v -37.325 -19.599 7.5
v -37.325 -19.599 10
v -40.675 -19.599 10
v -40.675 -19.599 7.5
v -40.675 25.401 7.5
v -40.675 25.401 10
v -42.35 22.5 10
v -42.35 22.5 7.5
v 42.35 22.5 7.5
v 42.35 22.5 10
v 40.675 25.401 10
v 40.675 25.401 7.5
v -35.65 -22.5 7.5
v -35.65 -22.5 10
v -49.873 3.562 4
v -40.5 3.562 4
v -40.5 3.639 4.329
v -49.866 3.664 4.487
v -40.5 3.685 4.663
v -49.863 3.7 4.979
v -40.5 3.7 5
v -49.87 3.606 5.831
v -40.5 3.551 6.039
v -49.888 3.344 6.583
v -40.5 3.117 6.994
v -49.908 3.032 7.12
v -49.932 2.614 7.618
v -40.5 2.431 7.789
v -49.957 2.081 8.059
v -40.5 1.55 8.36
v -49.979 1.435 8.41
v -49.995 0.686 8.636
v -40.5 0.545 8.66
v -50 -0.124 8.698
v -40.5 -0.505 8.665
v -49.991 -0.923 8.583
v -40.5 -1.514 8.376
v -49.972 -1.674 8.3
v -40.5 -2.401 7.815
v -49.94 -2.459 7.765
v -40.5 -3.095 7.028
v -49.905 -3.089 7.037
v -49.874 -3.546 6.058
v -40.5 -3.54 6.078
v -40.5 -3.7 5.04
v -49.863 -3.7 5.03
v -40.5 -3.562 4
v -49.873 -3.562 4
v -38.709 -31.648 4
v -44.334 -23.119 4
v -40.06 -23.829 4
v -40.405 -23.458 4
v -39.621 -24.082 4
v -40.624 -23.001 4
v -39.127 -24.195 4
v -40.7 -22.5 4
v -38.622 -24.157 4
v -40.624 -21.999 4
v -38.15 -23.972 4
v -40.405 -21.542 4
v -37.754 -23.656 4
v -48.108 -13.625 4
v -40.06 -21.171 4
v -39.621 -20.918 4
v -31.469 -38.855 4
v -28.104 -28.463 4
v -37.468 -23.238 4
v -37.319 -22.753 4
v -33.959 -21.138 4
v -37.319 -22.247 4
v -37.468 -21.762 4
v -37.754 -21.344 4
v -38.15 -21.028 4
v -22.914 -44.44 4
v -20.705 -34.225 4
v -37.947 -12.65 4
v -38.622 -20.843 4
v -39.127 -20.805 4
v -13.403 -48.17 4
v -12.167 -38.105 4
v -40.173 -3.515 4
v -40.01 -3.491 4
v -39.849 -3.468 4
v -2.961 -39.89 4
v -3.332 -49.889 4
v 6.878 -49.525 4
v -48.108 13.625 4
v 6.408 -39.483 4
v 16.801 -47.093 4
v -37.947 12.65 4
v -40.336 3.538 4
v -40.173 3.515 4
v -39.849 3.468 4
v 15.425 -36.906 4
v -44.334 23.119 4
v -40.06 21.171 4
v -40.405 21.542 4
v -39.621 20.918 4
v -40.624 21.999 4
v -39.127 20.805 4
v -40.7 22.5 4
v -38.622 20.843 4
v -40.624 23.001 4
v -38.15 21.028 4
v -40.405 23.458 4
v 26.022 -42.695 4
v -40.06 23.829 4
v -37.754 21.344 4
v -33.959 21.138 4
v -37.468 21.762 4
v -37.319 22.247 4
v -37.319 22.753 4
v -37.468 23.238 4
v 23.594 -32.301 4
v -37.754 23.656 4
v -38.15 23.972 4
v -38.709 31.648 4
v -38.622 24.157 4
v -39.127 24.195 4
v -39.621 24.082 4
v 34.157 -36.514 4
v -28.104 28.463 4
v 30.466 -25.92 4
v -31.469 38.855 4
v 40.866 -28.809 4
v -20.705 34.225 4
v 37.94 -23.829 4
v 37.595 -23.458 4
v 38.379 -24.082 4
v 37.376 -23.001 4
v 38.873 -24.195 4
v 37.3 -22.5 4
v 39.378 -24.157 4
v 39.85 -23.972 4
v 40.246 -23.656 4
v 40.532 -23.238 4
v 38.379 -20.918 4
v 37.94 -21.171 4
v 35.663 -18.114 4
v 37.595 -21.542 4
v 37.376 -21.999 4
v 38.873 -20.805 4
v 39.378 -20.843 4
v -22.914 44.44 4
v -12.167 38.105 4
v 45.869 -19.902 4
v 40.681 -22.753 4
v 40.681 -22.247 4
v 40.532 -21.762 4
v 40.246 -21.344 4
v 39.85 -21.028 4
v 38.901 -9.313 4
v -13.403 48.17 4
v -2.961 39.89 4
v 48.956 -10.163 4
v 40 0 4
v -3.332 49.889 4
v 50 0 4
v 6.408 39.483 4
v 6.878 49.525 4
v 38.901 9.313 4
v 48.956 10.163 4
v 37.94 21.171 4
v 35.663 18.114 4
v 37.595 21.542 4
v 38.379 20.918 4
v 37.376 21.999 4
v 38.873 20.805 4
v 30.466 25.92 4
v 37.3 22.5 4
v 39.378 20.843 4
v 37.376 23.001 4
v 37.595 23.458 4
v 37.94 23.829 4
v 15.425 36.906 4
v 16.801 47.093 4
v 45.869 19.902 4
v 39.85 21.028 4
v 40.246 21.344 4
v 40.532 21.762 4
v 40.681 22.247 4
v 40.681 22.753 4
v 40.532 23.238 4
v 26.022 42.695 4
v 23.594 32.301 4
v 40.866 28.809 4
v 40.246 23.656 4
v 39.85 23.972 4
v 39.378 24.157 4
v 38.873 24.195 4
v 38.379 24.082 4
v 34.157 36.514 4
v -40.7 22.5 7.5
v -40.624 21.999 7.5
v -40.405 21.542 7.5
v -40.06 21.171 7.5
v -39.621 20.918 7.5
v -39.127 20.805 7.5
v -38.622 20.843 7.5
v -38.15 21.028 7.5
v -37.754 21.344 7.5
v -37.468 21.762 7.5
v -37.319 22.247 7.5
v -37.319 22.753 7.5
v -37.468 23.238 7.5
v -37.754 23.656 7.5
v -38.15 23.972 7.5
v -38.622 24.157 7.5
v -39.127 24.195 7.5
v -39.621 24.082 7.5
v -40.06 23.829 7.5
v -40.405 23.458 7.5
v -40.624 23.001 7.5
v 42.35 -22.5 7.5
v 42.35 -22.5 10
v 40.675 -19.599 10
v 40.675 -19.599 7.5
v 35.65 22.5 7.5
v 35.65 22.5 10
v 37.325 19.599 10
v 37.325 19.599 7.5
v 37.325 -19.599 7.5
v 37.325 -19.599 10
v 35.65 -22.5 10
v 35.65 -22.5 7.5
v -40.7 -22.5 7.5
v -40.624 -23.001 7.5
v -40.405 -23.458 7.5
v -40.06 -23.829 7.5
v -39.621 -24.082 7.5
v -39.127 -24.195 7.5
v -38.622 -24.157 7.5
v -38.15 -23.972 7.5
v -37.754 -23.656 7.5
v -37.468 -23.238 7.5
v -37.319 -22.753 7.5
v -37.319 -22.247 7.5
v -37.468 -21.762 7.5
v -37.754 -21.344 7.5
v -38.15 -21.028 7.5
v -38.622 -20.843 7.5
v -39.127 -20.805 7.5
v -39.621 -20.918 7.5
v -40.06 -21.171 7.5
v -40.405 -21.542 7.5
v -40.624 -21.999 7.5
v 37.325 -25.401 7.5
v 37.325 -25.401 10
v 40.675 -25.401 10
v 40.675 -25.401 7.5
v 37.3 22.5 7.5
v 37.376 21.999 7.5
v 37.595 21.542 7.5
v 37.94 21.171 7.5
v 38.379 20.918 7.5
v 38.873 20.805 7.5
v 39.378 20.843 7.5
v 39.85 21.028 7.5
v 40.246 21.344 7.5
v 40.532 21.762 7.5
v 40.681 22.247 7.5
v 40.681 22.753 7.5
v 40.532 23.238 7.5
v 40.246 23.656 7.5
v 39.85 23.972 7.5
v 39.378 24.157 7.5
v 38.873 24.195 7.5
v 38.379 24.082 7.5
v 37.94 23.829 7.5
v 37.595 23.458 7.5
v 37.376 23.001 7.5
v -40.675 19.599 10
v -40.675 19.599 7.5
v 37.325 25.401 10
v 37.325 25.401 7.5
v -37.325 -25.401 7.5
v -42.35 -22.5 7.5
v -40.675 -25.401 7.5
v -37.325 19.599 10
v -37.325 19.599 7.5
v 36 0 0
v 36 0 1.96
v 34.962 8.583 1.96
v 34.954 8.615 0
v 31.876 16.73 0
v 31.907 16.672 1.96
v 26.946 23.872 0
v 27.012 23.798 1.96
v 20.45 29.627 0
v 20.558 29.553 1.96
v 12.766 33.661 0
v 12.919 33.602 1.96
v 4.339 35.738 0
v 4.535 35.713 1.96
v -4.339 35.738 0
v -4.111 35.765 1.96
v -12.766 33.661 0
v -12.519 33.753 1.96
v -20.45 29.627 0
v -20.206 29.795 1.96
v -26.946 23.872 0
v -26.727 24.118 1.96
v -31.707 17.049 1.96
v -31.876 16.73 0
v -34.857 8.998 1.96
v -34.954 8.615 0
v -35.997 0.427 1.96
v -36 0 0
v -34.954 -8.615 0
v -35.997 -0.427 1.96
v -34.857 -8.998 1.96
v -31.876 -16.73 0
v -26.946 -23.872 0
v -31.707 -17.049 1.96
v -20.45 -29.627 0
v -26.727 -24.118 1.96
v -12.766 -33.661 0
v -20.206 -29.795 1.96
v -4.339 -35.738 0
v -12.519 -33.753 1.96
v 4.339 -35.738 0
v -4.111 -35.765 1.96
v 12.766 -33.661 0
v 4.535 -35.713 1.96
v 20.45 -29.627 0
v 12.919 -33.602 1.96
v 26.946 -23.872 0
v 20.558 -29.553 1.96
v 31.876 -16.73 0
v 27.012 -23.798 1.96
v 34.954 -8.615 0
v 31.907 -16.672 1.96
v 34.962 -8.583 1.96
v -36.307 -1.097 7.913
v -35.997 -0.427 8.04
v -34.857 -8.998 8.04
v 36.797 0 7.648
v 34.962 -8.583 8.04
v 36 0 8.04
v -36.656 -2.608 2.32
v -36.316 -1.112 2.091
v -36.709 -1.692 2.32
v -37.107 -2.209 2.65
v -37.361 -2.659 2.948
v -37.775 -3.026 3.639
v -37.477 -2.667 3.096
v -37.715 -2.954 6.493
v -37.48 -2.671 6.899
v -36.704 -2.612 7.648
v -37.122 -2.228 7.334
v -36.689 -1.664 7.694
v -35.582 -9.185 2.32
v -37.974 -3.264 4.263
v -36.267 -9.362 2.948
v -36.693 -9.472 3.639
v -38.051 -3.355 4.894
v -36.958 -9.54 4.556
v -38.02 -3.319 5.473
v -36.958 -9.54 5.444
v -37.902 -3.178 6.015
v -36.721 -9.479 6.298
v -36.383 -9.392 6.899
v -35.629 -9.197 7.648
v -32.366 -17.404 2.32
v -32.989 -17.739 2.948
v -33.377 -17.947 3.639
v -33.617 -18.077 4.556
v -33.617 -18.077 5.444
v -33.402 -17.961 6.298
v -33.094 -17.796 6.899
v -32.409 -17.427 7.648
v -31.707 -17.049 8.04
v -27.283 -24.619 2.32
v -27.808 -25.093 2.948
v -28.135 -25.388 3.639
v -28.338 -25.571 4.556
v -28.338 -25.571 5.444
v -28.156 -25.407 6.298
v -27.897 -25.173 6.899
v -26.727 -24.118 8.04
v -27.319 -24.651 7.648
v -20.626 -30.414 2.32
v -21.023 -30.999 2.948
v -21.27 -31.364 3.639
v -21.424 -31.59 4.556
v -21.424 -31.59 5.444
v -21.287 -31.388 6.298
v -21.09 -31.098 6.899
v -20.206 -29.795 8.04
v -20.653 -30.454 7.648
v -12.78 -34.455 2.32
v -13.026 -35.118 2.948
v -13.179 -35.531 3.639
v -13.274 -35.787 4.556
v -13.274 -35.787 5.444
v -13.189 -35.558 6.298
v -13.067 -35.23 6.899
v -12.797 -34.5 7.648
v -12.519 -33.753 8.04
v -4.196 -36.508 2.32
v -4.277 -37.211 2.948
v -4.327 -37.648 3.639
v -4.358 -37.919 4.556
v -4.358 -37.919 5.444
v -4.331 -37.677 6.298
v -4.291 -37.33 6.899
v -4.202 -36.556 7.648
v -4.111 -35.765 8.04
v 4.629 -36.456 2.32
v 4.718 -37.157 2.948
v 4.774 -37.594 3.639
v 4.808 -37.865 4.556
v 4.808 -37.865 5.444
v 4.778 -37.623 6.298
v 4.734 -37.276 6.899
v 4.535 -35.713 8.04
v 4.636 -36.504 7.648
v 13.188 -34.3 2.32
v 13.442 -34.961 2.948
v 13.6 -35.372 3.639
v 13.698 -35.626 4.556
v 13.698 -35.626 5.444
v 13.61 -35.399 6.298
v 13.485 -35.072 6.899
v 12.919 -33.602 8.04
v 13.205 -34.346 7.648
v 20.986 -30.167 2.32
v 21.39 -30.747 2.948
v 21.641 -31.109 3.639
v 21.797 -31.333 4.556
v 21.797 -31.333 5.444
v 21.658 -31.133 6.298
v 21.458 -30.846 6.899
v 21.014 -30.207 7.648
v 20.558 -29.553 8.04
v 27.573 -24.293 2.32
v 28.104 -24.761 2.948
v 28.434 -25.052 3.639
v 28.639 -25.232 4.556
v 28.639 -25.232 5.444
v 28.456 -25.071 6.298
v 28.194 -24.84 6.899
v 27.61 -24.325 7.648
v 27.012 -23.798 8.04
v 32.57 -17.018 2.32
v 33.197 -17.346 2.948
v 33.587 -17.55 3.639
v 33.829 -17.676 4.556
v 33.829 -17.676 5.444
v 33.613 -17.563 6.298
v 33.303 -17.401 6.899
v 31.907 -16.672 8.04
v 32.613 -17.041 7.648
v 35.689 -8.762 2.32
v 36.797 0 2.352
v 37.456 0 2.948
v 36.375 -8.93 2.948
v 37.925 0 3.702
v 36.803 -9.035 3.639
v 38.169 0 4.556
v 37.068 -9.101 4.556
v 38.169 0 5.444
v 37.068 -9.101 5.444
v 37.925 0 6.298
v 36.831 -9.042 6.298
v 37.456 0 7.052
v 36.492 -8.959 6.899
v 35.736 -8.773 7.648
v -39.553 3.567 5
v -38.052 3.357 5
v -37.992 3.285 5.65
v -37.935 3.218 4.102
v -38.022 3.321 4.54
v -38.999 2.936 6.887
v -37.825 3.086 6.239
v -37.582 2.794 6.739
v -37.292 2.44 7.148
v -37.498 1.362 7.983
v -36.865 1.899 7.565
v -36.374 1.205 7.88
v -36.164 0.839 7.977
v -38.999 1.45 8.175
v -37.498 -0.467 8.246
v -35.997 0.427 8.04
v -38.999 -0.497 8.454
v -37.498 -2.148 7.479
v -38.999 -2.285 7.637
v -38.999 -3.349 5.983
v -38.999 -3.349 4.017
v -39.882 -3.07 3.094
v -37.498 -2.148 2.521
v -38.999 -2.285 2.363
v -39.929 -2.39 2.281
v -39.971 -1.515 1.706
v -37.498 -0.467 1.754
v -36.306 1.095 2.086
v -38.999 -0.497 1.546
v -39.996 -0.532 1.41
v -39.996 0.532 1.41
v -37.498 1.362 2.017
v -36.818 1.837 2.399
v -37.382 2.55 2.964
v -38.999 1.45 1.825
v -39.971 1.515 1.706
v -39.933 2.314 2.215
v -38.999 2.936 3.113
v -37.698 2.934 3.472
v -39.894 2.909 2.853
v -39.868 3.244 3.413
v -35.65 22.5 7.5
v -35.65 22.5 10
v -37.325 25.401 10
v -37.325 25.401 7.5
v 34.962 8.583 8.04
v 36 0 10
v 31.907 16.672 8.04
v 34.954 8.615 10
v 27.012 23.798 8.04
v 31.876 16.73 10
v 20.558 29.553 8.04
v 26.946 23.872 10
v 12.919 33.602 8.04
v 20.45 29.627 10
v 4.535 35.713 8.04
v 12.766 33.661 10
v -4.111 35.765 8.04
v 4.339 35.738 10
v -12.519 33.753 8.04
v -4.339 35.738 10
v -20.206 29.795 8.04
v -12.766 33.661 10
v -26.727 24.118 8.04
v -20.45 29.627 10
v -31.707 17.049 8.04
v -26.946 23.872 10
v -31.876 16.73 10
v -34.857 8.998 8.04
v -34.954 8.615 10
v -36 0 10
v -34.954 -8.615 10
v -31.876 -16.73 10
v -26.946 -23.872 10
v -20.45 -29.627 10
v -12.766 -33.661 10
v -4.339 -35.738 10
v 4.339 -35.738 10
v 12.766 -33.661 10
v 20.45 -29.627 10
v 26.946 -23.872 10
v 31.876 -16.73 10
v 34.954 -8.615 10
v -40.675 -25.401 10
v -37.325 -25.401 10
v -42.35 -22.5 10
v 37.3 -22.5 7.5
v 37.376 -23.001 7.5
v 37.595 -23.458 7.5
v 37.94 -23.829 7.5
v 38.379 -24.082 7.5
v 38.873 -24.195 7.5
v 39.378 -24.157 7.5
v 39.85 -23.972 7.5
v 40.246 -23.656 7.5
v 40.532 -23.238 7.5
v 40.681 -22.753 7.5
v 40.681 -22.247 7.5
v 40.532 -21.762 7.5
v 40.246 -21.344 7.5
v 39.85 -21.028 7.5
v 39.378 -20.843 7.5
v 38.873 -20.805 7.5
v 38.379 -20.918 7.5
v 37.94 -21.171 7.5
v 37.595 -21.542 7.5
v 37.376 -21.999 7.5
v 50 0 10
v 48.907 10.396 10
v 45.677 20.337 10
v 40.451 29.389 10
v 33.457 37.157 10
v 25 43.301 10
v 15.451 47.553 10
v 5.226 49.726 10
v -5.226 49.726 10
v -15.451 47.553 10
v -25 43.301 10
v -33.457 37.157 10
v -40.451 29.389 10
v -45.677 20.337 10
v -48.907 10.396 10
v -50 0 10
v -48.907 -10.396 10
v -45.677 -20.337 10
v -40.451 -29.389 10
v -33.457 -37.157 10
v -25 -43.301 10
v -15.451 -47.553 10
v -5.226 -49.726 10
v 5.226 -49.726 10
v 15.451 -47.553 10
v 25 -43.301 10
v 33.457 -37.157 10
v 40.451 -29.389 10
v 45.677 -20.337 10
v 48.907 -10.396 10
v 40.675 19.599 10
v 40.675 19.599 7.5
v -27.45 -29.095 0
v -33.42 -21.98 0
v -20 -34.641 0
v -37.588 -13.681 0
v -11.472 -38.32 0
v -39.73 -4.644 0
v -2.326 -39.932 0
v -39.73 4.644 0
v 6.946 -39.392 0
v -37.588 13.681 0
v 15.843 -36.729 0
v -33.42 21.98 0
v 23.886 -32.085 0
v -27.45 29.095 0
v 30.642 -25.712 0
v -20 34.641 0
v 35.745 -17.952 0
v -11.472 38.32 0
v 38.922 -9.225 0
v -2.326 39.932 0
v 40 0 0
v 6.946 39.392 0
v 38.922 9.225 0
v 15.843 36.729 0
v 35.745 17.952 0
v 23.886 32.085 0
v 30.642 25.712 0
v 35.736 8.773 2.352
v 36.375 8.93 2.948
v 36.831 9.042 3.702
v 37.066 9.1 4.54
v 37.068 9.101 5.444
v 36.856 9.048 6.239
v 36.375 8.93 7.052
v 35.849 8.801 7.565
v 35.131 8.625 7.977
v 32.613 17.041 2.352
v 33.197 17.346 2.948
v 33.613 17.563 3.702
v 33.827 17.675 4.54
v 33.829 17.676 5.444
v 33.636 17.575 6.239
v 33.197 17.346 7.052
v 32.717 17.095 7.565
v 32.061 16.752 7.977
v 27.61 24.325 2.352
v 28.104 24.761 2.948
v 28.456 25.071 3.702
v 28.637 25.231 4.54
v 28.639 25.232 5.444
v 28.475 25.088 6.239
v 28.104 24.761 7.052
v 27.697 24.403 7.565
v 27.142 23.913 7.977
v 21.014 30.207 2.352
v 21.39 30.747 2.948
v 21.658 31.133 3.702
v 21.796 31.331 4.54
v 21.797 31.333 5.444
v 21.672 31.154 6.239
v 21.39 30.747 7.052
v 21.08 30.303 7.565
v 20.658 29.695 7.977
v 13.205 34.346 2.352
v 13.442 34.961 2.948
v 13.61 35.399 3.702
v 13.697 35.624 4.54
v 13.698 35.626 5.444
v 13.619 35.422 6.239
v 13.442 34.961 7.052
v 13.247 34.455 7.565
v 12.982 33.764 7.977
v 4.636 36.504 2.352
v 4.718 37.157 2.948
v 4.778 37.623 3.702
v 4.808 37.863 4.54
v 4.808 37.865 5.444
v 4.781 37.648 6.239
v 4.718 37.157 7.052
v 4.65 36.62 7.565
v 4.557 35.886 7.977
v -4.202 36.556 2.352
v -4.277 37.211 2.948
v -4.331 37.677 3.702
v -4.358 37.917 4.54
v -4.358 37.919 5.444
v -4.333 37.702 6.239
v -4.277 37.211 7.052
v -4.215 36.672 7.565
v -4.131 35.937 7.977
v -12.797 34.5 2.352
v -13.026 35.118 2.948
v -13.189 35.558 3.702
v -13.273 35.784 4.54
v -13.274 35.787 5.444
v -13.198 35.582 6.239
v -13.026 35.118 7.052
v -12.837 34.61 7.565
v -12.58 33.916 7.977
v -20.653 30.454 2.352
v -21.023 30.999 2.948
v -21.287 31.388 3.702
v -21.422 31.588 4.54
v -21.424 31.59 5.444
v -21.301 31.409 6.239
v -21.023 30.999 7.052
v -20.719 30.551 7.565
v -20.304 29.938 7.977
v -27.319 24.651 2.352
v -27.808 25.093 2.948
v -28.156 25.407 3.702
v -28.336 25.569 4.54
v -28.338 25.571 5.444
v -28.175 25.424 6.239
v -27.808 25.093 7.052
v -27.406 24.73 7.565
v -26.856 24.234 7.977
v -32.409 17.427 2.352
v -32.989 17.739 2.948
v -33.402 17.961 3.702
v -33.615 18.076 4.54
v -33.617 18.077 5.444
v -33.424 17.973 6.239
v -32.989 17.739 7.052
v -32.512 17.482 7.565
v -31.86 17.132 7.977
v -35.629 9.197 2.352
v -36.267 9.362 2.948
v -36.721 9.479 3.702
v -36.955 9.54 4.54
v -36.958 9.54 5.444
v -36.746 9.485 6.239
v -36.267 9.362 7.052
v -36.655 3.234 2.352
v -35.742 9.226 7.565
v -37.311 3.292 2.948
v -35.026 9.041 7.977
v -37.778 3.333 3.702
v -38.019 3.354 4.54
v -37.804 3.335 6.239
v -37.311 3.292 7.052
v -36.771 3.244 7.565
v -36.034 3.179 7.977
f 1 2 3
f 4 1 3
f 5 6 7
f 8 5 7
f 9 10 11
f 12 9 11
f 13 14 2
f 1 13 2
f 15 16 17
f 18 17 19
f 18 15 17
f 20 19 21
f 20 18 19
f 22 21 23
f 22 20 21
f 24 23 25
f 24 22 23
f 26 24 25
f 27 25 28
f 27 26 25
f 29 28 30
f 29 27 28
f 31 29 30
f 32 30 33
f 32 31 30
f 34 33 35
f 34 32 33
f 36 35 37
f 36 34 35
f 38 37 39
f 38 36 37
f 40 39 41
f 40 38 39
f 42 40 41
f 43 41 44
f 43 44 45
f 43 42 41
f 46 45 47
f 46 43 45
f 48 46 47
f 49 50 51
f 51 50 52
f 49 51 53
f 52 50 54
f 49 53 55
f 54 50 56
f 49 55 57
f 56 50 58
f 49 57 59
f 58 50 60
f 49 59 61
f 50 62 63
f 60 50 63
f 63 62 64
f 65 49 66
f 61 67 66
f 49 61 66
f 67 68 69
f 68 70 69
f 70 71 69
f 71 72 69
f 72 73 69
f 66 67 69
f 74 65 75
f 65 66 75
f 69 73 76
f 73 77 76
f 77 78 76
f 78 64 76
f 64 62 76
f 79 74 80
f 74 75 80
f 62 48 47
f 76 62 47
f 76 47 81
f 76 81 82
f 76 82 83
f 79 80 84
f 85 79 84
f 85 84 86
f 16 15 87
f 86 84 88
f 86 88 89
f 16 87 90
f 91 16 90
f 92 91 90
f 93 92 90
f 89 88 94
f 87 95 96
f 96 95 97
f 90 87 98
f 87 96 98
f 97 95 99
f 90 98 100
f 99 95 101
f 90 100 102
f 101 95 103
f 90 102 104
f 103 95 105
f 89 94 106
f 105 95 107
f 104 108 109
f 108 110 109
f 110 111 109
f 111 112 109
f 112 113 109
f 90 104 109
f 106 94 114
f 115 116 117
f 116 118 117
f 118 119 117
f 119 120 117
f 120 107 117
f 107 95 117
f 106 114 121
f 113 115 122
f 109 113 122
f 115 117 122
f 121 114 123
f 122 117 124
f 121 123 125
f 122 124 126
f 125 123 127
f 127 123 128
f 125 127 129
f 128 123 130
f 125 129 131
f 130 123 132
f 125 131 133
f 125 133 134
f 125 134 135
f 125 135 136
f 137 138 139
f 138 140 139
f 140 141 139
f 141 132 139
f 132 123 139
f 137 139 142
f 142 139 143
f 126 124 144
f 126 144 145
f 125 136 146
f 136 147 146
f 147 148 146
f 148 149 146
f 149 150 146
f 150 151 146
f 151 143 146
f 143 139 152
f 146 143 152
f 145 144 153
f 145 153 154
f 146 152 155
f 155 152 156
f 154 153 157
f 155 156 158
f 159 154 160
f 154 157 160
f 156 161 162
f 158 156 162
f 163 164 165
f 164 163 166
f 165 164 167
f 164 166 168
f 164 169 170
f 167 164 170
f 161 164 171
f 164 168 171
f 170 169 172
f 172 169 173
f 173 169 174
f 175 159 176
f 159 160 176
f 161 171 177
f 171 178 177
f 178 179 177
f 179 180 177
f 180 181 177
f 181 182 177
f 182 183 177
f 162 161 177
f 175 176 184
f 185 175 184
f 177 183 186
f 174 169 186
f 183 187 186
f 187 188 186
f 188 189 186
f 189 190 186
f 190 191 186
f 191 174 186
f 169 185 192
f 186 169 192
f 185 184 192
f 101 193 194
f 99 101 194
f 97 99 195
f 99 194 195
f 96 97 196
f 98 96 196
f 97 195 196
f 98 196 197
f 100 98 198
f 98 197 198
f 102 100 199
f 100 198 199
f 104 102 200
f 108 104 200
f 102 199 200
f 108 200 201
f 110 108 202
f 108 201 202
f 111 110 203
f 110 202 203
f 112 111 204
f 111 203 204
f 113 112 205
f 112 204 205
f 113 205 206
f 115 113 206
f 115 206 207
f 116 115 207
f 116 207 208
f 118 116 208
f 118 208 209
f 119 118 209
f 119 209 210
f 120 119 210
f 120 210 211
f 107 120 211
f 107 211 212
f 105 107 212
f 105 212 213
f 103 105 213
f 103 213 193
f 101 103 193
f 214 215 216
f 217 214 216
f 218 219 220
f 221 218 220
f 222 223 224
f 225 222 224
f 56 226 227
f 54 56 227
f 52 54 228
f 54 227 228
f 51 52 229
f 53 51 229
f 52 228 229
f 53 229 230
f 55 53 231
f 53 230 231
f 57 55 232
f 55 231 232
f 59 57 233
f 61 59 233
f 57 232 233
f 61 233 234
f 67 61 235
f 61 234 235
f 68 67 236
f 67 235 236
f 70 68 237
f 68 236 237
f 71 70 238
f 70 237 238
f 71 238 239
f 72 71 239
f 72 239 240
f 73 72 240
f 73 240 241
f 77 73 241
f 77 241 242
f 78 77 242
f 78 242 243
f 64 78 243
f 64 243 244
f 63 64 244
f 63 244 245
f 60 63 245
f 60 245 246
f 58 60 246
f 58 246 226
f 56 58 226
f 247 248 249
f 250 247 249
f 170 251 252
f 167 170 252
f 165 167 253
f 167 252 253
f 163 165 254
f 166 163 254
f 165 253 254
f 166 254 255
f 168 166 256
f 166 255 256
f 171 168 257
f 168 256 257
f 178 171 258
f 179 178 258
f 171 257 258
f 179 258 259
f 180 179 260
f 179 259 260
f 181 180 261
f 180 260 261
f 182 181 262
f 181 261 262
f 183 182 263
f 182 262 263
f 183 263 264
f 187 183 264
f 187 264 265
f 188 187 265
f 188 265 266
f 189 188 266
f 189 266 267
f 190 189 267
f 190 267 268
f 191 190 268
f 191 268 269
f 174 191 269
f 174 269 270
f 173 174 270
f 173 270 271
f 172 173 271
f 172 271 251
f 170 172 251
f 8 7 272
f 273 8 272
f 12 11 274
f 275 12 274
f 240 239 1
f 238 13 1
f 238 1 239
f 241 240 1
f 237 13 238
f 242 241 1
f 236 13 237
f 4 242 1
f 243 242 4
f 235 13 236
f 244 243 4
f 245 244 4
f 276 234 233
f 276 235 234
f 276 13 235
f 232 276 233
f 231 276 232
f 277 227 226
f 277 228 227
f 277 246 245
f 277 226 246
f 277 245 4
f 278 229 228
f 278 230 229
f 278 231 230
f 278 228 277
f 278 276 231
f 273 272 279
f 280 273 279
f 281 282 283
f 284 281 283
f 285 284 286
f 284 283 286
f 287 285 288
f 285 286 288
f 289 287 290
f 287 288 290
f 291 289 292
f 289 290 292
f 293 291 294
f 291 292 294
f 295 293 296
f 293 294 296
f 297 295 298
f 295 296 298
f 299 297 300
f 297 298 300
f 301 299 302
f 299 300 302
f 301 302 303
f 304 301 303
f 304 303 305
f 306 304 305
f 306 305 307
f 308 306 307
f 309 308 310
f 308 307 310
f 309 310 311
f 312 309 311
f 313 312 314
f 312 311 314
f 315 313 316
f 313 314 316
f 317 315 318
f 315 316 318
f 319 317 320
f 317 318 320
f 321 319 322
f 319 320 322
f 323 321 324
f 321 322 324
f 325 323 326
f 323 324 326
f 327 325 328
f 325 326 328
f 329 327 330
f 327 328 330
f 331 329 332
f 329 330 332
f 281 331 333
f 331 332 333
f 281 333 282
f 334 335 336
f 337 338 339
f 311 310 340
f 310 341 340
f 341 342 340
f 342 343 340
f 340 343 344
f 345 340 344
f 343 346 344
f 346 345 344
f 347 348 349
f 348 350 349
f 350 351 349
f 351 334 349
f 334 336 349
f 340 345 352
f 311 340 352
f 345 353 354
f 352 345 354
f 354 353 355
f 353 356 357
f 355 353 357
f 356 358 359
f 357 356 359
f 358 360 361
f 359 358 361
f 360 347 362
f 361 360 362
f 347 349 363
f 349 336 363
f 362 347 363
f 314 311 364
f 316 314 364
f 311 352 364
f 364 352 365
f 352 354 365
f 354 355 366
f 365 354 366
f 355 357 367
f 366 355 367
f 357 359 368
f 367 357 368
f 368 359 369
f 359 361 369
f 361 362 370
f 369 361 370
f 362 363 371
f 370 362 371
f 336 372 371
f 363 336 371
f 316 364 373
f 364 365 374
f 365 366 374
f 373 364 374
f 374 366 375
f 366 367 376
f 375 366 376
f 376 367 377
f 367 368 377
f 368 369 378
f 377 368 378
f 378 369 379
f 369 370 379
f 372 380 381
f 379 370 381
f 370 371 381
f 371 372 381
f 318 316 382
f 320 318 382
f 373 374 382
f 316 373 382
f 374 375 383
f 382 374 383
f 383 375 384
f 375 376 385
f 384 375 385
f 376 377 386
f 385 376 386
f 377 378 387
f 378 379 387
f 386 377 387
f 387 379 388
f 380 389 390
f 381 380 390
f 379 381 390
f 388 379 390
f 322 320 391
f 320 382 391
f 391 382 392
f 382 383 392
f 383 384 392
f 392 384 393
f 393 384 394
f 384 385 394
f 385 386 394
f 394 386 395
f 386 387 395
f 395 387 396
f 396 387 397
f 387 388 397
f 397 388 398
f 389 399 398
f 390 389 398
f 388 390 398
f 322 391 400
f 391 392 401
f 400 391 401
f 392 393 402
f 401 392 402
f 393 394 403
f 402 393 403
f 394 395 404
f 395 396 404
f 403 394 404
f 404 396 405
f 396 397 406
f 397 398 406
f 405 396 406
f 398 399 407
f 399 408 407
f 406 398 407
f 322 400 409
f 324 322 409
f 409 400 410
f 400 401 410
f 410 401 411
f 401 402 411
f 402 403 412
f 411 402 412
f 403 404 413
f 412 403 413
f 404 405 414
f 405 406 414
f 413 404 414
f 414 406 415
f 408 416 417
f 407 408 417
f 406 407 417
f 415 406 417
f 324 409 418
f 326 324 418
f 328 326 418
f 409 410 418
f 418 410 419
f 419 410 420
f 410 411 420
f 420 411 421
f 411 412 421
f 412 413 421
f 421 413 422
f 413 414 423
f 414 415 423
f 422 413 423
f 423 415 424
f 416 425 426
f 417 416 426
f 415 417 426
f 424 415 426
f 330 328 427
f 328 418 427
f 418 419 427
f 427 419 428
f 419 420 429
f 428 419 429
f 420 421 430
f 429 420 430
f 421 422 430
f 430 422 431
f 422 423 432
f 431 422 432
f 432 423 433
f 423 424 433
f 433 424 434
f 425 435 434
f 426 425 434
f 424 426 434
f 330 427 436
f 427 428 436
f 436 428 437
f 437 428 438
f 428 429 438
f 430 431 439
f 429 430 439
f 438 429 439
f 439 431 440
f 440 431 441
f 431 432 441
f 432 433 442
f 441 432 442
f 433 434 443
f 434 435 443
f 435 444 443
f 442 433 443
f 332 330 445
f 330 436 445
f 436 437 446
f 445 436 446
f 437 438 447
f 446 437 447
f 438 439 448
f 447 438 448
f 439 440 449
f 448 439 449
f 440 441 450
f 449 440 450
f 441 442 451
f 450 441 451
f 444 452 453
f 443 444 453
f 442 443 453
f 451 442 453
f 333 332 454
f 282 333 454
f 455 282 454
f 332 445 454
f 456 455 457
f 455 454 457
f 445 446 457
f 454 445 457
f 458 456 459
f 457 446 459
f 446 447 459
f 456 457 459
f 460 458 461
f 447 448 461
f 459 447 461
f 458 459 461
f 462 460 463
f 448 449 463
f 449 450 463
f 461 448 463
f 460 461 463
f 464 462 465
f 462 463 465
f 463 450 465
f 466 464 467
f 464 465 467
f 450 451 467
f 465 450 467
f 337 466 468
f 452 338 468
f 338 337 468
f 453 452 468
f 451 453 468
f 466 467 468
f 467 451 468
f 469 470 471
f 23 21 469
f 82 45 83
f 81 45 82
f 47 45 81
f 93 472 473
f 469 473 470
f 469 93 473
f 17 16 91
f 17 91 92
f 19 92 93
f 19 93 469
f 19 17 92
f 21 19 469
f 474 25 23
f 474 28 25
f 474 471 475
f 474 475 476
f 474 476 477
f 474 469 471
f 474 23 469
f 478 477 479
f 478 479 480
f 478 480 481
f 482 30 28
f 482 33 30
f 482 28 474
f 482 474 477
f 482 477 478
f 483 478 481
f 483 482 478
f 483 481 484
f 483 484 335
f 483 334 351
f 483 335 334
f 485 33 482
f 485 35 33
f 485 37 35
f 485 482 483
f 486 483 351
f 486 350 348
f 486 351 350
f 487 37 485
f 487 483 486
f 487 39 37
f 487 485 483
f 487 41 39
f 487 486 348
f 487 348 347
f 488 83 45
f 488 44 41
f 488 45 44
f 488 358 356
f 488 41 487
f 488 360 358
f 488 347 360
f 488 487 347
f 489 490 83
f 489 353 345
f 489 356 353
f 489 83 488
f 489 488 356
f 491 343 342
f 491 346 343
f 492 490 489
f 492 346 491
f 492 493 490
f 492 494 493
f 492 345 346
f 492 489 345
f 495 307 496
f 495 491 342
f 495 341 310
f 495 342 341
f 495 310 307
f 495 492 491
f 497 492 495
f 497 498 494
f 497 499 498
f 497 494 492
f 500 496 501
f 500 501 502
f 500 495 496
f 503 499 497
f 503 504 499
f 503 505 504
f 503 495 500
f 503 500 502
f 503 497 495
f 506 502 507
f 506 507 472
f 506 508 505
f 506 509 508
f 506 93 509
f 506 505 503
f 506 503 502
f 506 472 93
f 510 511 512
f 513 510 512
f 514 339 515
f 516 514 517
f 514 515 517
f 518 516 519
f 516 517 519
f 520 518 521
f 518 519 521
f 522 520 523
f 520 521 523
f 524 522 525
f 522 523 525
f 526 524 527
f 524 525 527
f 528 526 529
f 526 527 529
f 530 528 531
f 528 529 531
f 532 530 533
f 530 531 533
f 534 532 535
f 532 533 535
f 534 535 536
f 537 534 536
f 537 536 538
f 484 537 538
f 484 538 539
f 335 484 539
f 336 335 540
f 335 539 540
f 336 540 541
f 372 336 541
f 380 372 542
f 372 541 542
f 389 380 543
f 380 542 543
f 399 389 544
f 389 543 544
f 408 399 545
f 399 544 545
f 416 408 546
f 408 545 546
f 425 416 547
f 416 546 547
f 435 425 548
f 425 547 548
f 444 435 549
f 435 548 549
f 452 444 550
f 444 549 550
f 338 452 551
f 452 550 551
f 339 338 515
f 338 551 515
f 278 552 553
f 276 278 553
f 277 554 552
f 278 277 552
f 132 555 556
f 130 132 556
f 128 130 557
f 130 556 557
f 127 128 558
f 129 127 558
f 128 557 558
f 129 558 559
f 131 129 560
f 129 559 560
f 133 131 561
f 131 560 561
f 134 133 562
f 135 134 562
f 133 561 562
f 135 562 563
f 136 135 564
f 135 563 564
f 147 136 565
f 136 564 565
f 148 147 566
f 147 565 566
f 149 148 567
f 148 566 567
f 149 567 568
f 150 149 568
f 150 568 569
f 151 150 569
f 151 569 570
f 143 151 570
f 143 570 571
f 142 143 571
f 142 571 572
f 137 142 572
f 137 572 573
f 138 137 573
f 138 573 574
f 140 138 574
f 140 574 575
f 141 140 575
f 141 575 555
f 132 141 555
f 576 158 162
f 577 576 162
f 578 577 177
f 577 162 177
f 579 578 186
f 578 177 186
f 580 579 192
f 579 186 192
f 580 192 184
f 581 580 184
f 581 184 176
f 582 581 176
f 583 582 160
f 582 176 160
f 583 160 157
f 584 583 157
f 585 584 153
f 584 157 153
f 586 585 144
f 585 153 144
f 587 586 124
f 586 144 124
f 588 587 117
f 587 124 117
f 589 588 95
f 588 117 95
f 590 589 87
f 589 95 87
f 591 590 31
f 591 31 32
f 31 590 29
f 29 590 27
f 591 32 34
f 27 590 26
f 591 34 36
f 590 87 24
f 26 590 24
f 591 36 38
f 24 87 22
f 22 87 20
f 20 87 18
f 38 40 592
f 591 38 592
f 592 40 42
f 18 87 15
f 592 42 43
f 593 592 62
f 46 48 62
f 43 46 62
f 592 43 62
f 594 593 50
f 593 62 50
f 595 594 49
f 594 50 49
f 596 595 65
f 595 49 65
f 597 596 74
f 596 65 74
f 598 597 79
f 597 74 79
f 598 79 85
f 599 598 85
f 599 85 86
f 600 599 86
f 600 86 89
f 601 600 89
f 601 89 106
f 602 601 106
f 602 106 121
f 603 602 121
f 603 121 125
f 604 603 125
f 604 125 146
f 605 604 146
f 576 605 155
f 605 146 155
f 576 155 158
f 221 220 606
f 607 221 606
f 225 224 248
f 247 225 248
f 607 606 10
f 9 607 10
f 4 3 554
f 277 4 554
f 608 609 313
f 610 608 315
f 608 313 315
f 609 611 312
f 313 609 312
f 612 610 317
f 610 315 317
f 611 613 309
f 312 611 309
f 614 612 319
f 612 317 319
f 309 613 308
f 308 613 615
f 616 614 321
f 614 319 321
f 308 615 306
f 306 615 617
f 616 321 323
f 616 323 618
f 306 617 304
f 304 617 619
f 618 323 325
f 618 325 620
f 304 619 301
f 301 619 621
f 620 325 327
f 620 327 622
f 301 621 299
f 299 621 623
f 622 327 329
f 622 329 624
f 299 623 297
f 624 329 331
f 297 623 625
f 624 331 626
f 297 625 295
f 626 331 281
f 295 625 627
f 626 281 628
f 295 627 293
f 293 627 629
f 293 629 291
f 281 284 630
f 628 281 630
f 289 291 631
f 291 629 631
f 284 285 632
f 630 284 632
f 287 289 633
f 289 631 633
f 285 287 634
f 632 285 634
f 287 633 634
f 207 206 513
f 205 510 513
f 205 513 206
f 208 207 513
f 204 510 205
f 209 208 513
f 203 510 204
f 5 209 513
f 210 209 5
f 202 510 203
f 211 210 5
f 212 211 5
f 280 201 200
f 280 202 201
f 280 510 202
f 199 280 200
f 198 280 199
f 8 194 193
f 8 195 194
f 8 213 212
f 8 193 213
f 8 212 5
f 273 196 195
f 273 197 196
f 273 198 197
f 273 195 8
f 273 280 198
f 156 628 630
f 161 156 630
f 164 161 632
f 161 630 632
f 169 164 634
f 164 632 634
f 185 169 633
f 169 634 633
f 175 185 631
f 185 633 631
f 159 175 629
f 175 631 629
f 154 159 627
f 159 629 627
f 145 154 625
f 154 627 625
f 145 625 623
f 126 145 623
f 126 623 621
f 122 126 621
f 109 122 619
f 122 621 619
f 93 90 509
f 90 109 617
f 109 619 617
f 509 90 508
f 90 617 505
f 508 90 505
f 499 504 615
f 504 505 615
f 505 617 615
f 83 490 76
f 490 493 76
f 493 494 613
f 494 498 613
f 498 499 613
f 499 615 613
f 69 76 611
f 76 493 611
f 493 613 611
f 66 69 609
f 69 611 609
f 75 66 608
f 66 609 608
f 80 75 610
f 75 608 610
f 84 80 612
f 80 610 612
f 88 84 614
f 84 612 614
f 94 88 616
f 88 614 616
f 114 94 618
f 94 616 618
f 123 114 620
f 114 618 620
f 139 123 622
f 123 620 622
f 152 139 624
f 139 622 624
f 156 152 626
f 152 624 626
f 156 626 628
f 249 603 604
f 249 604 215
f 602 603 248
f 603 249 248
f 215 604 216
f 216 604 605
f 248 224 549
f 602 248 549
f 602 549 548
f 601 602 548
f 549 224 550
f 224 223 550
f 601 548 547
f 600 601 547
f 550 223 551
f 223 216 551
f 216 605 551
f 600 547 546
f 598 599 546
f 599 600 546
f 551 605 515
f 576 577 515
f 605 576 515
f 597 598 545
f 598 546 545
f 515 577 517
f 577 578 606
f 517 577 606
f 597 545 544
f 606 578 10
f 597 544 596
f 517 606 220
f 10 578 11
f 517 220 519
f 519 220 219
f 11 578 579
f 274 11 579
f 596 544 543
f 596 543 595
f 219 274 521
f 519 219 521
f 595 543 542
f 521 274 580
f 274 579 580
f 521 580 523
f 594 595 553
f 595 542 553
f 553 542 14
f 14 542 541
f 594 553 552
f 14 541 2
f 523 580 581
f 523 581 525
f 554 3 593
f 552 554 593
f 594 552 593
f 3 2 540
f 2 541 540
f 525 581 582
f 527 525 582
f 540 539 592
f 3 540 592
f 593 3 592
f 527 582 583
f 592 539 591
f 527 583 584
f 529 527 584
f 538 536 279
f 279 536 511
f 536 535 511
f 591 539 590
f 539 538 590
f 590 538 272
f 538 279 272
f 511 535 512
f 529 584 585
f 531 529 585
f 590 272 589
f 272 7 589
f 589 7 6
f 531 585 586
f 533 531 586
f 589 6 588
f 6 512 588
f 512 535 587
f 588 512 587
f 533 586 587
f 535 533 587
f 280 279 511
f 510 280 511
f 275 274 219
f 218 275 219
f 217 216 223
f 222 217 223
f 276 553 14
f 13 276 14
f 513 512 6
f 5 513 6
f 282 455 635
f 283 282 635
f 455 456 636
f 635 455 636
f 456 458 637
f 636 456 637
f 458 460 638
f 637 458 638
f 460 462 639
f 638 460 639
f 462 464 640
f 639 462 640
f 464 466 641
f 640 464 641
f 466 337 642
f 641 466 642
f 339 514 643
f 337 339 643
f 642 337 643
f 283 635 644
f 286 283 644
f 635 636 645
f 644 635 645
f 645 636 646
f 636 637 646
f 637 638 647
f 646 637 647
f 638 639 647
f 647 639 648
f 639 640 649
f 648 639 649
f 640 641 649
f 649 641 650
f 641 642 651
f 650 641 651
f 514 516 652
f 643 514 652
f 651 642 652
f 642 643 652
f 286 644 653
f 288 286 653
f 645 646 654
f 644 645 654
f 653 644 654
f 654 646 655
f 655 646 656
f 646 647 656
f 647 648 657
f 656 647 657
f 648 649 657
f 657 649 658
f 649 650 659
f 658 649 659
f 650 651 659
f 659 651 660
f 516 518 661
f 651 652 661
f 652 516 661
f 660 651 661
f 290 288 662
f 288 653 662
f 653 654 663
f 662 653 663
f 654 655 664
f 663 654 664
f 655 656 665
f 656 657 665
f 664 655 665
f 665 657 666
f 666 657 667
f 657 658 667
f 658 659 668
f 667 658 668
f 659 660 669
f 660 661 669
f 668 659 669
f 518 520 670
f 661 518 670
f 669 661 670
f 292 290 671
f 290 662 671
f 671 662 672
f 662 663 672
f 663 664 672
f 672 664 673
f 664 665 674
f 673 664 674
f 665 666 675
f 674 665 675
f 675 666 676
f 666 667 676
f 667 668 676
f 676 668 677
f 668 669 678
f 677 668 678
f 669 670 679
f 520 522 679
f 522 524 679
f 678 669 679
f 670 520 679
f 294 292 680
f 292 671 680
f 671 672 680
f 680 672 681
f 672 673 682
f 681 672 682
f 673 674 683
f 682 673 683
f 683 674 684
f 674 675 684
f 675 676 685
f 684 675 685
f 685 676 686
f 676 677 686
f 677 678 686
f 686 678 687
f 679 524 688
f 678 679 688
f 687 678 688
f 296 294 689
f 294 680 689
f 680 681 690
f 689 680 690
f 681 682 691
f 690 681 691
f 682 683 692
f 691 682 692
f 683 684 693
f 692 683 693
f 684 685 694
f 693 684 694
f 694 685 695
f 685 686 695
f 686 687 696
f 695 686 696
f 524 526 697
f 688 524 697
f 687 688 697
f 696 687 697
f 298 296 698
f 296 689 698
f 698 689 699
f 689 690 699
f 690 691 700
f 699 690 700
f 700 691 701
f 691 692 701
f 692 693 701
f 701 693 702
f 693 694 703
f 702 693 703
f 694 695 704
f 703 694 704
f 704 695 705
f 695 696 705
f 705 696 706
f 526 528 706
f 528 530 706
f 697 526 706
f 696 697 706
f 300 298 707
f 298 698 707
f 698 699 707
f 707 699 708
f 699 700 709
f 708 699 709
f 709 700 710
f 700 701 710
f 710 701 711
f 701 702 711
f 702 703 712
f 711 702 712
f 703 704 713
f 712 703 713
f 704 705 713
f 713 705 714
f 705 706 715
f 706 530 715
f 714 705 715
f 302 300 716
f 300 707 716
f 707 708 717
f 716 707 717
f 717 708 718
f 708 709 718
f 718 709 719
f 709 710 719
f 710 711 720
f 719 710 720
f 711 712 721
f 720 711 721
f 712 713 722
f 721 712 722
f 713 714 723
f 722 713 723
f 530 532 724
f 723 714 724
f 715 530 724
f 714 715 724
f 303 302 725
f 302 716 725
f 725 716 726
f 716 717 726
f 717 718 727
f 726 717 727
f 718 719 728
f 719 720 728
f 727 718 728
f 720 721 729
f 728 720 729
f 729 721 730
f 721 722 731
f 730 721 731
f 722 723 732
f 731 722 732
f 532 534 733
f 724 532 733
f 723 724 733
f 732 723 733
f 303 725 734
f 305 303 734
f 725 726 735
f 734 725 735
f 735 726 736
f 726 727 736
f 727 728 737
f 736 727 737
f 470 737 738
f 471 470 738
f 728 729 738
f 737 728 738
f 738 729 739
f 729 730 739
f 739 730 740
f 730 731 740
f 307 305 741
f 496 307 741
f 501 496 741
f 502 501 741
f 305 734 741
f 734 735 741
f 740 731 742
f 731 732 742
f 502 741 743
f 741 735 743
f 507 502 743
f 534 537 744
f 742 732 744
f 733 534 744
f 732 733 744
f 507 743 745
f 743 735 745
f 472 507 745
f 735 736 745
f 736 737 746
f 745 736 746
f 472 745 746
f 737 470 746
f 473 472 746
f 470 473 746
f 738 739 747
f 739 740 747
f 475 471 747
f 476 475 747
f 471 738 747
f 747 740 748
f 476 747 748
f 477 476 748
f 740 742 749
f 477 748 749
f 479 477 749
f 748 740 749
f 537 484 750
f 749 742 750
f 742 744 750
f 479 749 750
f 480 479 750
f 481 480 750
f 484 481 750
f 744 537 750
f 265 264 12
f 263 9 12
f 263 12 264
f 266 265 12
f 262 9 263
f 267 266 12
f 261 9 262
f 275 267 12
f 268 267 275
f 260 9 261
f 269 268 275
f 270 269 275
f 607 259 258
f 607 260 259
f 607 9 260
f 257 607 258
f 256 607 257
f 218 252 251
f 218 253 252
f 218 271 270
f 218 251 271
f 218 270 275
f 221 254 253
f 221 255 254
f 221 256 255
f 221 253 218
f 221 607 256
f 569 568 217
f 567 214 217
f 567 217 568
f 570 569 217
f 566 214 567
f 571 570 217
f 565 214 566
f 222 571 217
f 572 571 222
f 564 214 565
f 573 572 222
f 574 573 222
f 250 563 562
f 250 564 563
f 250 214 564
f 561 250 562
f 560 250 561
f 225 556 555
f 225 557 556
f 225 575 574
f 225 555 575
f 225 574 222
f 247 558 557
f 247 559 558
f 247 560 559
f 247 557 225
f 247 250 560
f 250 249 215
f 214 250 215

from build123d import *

# Parameters (mm, degrees)
SKETCH002_R     = 1.7
POCKET_DEPTH    = 10.001
POCKET001_DEPTH = 2.5


with BuildPart() as part:
    # Sketch → Revolution (revolve)
    with BuildSketch(Plane.XZ):
        with BuildLine():
            ThreePointArc((36, 1.960263), (38.2, 5), (36, 8.039737))
            Line((36, 8.039737), (36, 10))
            Line((36, 10), (50, 10))
            Line((50, 10), (50, 4))
            Line((50, 4), (40, 4))
            Line((40, 4), (40, 0))
            Line((40, 0), (36, 0))
            Line((36, 0), (36, 1.960263))
        make_face()
    revolve(axis=Axis((0, 0, 0), (0, 0, 1)))

    # Sketch001 (on DatumPlane) → Groove (revolve, cut)
    with BuildSketch(Plane.XY.offset(5)):
        Polygon((-35.5, 0), (-35.5, 3), (-40.5, 3.7), (-51.5, 3.7), (-51.5, 0), align=None)
    revolve(axis=Axis((0, 0, 5), (1, 0, 0)), mode=Mode.SUBTRACT)

    # Sketch002 (on Face6 of Groove) → Pocket (cut, through all)
    with BuildSketch(Plane(origin=(0, 0, 10), x_dir=(-1, 0, 0), z_dir=(0, 0, 1))):
        with Locations((39, -22.5)):
            Circle(SKETCH002_R)
        with Locations((39, 22.5)):
            Circle(SKETCH002_R)
        with Locations((-39, 22.5)):
            Circle(SKETCH002_R)
        with Locations((-39, -22.5)):
            Circle(SKETCH002_R)
    extrude(amount=-POCKET_DEPTH, mode=Mode.SUBTRACT)

    # Sketch003 (on Face6 of Pocket) → Pocket001 (cut)
    with BuildSketch(Plane(origin=(0, 0, 10), x_dir=(-1, 0, 0), z_dir=(0, 0, 1))):
        Polygon((37.325, 25.401185), (35.65, 22.5), (37.325, 19.598815), (40.675, 19.598815), (42.35, 22.5), (40.675, 25.401185), align=None)
        Polygon((-37.325, 25.401185), (-40.675, 25.401185), (-42.35, 22.5), (-40.675, 19.598815), (-37.325, 19.598815), (-35.65, 22.5), align=None)
        Polygon((-37.325, -19.598815), (-40.675, -19.598815), (-42.35, -22.5), (-40.675, -25.401185), (-37.325, -25.401185), (-35.65, -22.5), align=None)
        Polygon((40.675, -19.598815), (37.325, -19.598815), (35.65, -22.5), (37.325, -25.401185), (40.675, -25.401185), (42.35, -22.5), align=None)
    extrude(amount=-POCKET001_DEPTH, mode=Mode.SUBTRACT)


solid = part.part
